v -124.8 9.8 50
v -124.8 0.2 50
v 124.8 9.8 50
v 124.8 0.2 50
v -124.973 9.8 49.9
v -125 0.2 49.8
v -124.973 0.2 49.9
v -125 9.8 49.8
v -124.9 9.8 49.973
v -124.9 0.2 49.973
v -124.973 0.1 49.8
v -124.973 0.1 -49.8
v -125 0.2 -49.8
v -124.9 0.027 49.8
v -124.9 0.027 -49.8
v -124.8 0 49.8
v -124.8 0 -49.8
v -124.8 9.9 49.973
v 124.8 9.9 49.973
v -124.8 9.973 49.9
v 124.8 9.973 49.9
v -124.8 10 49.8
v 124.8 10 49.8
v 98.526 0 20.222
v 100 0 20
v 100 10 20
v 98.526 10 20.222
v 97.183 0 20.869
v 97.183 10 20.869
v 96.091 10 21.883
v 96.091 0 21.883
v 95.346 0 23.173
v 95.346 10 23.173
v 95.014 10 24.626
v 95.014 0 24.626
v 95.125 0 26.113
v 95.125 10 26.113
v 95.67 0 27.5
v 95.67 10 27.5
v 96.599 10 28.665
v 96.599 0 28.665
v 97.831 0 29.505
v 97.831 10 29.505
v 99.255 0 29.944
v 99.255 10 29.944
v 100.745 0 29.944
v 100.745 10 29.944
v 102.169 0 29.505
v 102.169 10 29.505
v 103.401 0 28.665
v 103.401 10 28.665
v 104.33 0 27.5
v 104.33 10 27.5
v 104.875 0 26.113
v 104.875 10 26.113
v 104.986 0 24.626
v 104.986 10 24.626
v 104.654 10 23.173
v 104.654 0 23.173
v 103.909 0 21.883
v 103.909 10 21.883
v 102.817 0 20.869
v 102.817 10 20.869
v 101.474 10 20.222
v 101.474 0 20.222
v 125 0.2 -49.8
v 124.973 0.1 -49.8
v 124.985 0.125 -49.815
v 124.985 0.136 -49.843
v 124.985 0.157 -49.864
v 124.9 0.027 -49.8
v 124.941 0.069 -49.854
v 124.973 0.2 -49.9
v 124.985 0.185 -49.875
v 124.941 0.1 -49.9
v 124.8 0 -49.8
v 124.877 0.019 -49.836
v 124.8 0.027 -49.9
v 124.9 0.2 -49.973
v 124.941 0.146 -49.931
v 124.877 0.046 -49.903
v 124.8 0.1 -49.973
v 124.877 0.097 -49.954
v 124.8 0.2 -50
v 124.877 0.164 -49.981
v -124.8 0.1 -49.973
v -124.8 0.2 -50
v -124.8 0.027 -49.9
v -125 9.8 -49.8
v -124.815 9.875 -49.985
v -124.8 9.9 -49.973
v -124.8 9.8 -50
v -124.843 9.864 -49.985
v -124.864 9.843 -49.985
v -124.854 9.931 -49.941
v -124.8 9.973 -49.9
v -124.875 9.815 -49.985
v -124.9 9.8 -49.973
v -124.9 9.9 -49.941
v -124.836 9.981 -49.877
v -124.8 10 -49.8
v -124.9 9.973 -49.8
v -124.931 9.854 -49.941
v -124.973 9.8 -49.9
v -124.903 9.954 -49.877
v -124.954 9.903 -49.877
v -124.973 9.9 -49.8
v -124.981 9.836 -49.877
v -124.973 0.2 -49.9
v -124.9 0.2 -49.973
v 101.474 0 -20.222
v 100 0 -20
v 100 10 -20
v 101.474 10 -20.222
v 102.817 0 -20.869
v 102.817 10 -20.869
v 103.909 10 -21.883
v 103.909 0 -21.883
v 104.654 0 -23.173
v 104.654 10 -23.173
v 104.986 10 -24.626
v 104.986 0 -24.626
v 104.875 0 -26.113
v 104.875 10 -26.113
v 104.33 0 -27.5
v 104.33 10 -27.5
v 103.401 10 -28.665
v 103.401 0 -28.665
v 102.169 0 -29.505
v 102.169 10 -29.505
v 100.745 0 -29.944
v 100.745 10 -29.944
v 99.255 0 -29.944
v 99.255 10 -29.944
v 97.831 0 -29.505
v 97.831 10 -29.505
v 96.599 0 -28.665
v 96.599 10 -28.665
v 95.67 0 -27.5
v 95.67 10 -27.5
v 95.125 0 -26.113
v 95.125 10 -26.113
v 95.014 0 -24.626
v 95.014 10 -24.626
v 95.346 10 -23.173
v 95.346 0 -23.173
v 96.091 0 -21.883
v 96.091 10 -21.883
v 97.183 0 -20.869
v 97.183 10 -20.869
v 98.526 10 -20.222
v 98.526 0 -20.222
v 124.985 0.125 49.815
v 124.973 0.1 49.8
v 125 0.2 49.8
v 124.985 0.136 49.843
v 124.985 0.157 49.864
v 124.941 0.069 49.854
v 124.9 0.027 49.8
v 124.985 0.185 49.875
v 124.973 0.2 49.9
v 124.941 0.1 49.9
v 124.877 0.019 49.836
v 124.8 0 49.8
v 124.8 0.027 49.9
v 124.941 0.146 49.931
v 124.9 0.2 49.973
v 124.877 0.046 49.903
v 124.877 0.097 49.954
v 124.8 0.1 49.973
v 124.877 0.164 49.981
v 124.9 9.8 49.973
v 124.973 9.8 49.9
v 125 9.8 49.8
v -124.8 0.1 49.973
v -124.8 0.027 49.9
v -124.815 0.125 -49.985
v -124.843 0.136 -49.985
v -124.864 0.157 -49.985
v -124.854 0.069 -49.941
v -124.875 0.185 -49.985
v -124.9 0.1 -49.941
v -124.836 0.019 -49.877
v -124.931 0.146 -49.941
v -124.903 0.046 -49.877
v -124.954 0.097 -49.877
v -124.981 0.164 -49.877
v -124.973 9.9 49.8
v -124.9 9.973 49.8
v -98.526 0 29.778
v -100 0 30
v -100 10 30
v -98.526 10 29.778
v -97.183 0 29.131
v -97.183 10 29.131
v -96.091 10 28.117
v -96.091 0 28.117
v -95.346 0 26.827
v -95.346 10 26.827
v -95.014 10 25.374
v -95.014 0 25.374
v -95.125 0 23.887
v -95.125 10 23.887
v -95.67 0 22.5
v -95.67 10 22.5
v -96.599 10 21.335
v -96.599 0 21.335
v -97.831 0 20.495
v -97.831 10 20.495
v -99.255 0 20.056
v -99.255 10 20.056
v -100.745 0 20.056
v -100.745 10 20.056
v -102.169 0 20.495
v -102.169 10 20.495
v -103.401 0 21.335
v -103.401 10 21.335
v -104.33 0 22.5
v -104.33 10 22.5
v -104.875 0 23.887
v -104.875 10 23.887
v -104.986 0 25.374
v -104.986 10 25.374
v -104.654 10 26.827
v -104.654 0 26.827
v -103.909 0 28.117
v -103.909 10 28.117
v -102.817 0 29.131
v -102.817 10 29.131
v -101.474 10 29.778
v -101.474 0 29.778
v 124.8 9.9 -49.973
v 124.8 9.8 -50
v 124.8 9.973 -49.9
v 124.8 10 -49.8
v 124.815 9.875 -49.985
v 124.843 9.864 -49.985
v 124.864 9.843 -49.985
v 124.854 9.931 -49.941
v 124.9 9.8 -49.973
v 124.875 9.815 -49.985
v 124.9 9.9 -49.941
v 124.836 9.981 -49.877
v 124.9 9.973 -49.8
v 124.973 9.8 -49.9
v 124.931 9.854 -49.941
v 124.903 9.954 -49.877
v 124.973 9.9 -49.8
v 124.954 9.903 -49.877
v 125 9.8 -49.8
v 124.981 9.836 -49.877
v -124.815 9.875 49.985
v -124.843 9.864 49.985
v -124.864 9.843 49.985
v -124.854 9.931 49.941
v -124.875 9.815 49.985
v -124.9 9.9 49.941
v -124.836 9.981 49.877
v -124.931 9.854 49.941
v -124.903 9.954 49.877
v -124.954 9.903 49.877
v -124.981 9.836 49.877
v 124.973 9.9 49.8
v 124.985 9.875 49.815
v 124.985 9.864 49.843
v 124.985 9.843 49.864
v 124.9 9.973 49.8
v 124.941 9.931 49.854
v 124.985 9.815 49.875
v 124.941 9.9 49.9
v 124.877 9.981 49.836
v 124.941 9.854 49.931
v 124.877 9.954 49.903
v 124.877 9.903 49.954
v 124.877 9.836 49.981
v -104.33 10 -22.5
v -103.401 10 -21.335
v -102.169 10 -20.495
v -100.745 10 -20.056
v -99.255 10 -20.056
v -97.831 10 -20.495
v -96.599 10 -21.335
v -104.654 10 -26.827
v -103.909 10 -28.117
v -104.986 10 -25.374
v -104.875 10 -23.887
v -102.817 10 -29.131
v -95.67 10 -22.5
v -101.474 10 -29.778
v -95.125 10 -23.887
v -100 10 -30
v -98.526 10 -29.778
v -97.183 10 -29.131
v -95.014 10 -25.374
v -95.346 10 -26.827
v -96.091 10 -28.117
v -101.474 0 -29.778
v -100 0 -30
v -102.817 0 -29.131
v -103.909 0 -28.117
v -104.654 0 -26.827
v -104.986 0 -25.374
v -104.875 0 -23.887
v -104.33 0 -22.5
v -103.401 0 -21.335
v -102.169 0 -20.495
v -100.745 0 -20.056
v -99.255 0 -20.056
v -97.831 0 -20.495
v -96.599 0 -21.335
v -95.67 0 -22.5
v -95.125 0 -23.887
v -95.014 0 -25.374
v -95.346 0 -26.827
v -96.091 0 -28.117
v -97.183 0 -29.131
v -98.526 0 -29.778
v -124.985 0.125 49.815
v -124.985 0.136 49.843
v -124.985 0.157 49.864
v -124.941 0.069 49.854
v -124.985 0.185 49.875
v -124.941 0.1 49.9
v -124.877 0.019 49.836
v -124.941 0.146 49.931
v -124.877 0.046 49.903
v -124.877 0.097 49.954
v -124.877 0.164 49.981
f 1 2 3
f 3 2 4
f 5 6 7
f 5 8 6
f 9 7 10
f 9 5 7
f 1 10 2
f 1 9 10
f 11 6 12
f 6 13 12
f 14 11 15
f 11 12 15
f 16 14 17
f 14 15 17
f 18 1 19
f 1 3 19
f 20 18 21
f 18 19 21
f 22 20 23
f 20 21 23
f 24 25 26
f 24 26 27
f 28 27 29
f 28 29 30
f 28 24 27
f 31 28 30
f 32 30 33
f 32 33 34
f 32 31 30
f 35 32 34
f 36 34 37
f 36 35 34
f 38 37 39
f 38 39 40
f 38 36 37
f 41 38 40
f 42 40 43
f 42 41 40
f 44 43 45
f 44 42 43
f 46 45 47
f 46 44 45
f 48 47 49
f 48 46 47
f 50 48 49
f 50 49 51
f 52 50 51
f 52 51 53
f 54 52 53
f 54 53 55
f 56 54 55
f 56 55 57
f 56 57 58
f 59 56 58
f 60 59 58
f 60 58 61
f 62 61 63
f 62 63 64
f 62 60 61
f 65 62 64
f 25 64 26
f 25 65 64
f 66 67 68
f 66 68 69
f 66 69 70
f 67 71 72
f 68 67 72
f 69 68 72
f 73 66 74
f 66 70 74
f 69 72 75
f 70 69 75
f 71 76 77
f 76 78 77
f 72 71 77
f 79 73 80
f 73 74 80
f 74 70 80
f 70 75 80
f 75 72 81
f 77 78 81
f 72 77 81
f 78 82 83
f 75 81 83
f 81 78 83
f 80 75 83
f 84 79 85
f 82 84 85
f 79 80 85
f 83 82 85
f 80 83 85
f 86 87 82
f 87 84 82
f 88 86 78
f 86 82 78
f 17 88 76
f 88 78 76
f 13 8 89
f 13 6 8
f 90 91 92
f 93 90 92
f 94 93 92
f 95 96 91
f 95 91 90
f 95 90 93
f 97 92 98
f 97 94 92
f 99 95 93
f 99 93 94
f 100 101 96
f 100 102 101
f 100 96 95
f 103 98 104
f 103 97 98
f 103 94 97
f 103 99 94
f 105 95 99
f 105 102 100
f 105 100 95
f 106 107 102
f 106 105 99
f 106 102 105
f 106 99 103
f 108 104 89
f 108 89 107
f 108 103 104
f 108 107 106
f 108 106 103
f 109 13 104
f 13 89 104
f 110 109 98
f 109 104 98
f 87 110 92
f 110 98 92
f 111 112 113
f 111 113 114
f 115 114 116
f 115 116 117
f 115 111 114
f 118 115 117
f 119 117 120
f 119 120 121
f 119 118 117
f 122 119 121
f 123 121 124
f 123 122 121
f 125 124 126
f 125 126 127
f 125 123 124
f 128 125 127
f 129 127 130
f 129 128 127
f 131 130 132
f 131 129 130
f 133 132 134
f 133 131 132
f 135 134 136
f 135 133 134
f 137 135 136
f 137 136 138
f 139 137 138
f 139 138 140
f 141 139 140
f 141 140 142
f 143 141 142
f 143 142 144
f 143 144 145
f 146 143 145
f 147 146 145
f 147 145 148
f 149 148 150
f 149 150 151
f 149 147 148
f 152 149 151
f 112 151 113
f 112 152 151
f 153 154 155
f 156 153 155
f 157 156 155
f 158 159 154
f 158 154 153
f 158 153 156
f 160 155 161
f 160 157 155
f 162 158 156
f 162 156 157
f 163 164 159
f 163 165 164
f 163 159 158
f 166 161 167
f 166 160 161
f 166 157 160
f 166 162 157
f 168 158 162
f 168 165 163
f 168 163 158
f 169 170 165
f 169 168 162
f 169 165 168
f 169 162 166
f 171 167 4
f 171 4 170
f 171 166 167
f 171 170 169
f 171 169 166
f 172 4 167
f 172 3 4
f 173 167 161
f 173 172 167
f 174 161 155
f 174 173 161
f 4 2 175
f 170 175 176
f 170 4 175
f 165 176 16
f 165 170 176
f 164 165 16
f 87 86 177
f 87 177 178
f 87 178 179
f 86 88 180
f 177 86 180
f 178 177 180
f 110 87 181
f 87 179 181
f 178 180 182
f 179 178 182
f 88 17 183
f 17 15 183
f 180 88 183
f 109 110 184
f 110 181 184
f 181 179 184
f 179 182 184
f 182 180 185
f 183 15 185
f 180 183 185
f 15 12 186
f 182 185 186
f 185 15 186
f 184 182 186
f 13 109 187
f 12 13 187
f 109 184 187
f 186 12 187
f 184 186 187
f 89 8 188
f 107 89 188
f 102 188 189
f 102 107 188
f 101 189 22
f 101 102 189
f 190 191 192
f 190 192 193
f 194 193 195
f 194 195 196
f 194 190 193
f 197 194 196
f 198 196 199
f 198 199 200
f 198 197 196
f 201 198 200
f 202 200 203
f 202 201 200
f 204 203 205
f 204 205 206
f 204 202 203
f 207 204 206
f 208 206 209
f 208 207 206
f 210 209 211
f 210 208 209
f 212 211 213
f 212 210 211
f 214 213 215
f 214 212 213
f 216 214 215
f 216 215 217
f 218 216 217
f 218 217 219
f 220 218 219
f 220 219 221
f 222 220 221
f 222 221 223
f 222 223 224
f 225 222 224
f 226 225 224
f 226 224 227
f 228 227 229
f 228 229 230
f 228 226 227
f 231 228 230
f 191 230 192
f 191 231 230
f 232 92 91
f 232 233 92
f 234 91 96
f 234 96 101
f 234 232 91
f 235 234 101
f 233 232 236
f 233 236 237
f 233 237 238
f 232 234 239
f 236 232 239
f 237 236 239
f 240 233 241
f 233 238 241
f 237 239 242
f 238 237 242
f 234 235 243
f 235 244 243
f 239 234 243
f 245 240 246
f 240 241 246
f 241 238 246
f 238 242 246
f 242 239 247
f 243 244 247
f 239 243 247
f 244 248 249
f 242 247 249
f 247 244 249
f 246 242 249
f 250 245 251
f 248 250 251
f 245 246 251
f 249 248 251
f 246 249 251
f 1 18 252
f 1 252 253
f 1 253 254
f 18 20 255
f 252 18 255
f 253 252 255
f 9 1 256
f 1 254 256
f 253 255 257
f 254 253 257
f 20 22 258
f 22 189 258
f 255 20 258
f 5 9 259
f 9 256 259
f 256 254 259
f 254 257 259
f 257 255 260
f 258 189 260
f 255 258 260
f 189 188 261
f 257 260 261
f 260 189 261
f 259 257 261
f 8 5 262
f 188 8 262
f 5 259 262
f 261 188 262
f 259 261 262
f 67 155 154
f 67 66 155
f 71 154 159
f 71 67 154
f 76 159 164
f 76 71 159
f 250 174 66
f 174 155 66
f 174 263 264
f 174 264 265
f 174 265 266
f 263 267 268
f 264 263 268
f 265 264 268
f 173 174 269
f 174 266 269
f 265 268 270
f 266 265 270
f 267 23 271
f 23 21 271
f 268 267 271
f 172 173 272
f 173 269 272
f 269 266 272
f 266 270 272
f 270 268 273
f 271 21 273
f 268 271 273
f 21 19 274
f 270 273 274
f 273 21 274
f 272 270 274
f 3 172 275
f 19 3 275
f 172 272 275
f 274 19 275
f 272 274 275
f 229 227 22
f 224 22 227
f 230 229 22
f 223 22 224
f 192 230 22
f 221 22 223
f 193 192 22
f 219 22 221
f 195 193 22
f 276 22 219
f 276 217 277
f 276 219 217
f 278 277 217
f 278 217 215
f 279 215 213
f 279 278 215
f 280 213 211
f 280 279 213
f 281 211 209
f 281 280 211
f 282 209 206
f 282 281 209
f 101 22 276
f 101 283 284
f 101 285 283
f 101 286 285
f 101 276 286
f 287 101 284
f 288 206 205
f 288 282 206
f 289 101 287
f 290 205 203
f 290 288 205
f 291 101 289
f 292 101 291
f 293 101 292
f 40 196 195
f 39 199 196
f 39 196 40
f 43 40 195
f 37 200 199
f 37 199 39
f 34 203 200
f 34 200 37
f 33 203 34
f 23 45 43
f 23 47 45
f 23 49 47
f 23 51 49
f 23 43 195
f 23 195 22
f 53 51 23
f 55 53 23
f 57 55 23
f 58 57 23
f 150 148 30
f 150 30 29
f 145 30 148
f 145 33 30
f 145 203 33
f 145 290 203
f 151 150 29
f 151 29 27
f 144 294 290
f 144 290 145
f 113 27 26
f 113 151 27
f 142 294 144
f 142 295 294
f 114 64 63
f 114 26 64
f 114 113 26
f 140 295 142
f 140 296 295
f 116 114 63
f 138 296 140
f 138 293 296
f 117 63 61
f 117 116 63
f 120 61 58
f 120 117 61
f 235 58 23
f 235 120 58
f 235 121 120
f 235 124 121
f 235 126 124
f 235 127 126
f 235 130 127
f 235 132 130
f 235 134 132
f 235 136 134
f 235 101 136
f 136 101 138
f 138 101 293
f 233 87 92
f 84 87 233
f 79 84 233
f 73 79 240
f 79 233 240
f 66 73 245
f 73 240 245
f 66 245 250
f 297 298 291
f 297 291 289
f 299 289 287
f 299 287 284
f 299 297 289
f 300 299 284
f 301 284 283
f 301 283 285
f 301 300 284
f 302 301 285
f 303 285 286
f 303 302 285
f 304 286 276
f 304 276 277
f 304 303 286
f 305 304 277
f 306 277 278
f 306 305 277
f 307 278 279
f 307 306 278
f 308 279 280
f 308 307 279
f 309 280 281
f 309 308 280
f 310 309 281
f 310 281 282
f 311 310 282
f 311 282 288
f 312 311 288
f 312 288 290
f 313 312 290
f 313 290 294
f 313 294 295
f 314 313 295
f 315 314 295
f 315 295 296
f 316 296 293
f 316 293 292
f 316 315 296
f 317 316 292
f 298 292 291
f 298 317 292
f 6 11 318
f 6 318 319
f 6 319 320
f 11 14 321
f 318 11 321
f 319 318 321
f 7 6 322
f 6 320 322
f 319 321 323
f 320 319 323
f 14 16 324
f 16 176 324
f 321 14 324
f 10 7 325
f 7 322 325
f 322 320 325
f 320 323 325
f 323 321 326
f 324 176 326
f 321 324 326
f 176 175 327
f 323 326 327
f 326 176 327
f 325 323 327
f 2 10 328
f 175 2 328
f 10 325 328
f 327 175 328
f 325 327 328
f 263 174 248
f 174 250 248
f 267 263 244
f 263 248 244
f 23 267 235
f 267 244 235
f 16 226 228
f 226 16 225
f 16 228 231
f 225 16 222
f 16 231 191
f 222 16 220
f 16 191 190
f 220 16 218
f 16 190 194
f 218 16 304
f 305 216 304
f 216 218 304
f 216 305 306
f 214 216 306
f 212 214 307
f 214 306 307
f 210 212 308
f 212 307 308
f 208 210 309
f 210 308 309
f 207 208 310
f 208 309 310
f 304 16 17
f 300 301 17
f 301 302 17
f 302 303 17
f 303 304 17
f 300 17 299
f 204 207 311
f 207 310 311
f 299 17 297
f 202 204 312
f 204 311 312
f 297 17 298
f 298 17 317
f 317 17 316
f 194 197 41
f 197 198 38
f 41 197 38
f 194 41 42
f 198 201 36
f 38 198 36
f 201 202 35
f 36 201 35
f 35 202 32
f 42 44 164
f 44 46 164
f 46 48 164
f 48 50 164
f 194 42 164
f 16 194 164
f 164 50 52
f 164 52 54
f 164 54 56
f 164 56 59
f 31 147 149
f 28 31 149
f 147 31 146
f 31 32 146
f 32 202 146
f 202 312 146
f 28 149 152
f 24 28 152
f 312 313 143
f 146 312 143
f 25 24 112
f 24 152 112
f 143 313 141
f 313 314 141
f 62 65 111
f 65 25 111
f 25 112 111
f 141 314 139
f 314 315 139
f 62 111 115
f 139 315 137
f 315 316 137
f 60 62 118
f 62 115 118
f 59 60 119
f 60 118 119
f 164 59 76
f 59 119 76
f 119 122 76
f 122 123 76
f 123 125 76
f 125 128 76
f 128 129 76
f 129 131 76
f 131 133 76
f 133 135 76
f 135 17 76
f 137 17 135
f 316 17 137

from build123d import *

# Parameters (mm, degrees)
SKETCH1_W           = 250
SKETCH1_H           = 100
SKETCH1_R           = 5
BOSS_EXTRUDE1_DEPTH = 10
FILLET1_R           = 0.2


with BuildPart() as part:
    # Sketch1 → Boss-Extrude1 (new body)
    with BuildSketch(Plane(origin=(0, 0, 0), x_dir=(1, 0, 0), z_dir=(0, 1, 0))):
        Rectangle(SKETCH1_W, SKETCH1_H)
        with Locations(Location((100, 25, 0), (0, 0, 270))):
            Circle(SKETCH1_R, mode=Mode.SUBTRACT)
        with Locations(Location((100, -25, 0), (0, 0, 90))):
            Circle(SKETCH1_R, mode=Mode.SUBTRACT)
        with Locations(Location((-100, -25, 0), (0, 0, 270))):
            Circle(SKETCH1_R, mode=Mode.SUBTRACT)
        with Locations(Location((-100, 25, 0), (0, 0, 90))):
            Circle(SKETCH1_R, mode=Mode.SUBTRACT)
    extrude(amount=BOSS_EXTRUDE1_DEPTH)

    # Fillet1
    fillet1_edges = [part.edges().sort_by_distance(p)[0] for p in [
        (-125, 10, 0),
        (0, 10, 50),
        (125, 10, 0),
        (0, 0, 50),
        (-125, 0, 0),
        (0, 0, -50),
        (125, 0, 0),
        (0, 10, -50),
        (125, 5, 50),
        (-125, 5, 50),
        (-125, 5, -50),
        (125, 5, -50),
    ]]
    fillet(fillet1_edges, radius=FILLET1_R)


solid = part.part
